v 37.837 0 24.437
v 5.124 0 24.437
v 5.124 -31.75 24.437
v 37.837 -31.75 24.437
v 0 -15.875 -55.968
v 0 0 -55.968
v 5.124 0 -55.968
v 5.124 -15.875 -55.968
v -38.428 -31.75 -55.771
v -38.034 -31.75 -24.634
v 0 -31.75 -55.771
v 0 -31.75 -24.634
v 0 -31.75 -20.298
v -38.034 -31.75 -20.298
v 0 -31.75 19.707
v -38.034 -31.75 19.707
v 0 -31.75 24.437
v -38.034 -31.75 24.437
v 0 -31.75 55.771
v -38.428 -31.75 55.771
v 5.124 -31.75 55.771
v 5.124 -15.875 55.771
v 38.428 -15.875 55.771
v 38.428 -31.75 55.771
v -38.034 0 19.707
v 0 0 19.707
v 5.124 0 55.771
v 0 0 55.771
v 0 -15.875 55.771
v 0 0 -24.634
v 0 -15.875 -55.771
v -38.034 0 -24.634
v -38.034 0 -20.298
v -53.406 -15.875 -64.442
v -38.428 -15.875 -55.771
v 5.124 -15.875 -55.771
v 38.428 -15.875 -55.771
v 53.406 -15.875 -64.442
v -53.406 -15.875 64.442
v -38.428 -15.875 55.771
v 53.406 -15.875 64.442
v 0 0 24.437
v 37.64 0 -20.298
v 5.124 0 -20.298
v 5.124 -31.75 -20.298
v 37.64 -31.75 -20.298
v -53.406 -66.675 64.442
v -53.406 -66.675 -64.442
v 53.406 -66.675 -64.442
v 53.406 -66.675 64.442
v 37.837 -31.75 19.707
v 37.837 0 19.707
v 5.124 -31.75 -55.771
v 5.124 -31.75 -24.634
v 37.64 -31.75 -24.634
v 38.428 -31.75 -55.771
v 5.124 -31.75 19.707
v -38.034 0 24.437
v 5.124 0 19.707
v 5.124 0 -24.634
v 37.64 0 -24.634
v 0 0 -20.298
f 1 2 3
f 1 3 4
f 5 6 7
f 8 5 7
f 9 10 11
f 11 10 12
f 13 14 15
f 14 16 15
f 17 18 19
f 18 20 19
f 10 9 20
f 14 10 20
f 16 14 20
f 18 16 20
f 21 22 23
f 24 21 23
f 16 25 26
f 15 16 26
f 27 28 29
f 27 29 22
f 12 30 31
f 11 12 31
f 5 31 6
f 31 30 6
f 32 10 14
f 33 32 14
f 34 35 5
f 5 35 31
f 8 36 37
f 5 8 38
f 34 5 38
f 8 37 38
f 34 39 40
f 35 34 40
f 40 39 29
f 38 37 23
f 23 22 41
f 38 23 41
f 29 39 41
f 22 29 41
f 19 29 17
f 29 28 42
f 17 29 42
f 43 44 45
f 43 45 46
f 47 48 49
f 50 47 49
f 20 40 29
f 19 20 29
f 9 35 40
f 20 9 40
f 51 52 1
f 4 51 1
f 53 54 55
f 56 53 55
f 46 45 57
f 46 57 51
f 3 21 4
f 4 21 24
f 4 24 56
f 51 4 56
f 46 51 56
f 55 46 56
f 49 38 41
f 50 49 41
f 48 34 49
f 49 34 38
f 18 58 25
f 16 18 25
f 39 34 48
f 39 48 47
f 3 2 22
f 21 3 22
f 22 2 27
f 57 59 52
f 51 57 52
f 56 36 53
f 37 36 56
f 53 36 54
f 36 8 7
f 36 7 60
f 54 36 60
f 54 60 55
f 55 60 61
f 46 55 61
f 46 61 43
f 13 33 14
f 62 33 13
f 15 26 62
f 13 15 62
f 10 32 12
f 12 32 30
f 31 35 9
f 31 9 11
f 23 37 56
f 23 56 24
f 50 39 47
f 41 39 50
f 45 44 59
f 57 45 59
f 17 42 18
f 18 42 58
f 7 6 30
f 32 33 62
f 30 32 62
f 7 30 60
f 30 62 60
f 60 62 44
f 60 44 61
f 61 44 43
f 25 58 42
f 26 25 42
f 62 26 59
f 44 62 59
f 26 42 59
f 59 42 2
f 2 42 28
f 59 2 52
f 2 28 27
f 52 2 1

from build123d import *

# Parameters (mm, degrees)
F0_W     = 76.8568962812
F0_H     = 111.5410327911
F1_DEPTH = 25.4
F2_W     = 38.4284481406
F2_H     = 31.9251716137
F2_H_2   = 42.9610349238
F2_H_3   = 36.6548262537
F3_DEPTH = 9.525
F4_W     = 106.8113818765
F4_H     = 128.8831084967
F5_DEPTH = 50.8
F6_DEPTH = 31.75
F7_W     = 5.1237931475
F7_H     = 31.333964318
F7_H_2   = 4.72965464
F7_H_3   = 40.0050021708
F7_W_2   = 32.7134476975
F7_H_4   = 4.3355170637
F7_W_3   = 38.0343087018
F7_W_4   = 32.5163798407
F8_DEPTH = 50.8


with BuildPart() as f1:
    # F0 (on Front) → F1 (new body)
    with BuildSketch(Plane.XZ):
        Rectangle(F0_W, F0_H)
    extrude(amount=F1_DEPTH)

    # F2 (on face) → F3 (cut)
    with BuildSketch(Plane.XZ.offset(25.4)):
        with Locations((-19.2142240703, 39.8079305887)):
            Rectangle(F2_W, F2_H)
        with Locations((19.2142240703, 39.8079305887)):
            Rectangle(F2_W, F2_H)
        with Locations((19.2142240703, 2.36482732)):
            Rectangle(F2_W, F2_H_2)
        with Locations((-19.2142240703, 2.36482732)):
            Rectangle(F2_W, F2_H_2)
        with Locations((-19.2142240703, -37.4431032687)):
            Rectangle(F2_W, F2_H_3)
        with Locations((19.2142240703, -37.4431032687)):
            Rectangle(F2_W, F2_H_3)
    extrude(amount=-F3_DEPTH, mode=Mode.SUBTRACT)

    # F4 (on face) → F5 (join)
    with BuildSketch(Plane.XZ.offset(15.875)):
        Rectangle(F4_W, F4_H)
    extrude(amount=F5_DEPTH)

    # F6 (cut): a face of the model
    f6_faces = [f1.faces().sort_by_distance(p)[0] for p in [
        (0, 0, 0),
    ]]
    extrude(f6_faces, amount=-F6_DEPTH, mode=Mode.SUBTRACT)

    # F7 (on Front) → F8 (join)
    with BuildSketch(Plane.XZ):
        with Locations((2.5618965738, 40.1035342366)):
            Rectangle(F7_W, F7_H)
        with Locations((2.5618965738, 22.0717247576)):
            Rectangle(F7_W, F7_H_2)
        Polygon((0, 19.7068974376), (0, 24.4365520775), (-37.4431051314, 24.4365520775), (-38.0343087018, 24.4365520775), (-38.0343087018, 19.7068974376), align=None)
        with Locations((2.5618965738, -0.2956036478)):
            Rectangle(F7_W, F7_H_3)
        with Locations((21.4805169962, 22.0717247576)):
            Rectangle(F7_W_2, F7_H_2)
        with Locations((2.5618965738, -22.4658632651)):
            Rectangle(F7_W, F7_H_4)
        with Locations((-19.0171543509, -22.4658632651)):
            Rectangle(F7_W_3, F7_H_4)
        Polygon((5.1237931475, -24.633621797), (0, -24.633621797), (0, -54.5881018043), (0, -55.9675879776), (5.1237931475, -55.9675879776), align=None)
        with Locations((21.3819830678, -22.4658632651)):
            Rectangle(F7_W_4, F7_H_4)
    extrude(amount=F8_DEPTH)


solid = f1.part
